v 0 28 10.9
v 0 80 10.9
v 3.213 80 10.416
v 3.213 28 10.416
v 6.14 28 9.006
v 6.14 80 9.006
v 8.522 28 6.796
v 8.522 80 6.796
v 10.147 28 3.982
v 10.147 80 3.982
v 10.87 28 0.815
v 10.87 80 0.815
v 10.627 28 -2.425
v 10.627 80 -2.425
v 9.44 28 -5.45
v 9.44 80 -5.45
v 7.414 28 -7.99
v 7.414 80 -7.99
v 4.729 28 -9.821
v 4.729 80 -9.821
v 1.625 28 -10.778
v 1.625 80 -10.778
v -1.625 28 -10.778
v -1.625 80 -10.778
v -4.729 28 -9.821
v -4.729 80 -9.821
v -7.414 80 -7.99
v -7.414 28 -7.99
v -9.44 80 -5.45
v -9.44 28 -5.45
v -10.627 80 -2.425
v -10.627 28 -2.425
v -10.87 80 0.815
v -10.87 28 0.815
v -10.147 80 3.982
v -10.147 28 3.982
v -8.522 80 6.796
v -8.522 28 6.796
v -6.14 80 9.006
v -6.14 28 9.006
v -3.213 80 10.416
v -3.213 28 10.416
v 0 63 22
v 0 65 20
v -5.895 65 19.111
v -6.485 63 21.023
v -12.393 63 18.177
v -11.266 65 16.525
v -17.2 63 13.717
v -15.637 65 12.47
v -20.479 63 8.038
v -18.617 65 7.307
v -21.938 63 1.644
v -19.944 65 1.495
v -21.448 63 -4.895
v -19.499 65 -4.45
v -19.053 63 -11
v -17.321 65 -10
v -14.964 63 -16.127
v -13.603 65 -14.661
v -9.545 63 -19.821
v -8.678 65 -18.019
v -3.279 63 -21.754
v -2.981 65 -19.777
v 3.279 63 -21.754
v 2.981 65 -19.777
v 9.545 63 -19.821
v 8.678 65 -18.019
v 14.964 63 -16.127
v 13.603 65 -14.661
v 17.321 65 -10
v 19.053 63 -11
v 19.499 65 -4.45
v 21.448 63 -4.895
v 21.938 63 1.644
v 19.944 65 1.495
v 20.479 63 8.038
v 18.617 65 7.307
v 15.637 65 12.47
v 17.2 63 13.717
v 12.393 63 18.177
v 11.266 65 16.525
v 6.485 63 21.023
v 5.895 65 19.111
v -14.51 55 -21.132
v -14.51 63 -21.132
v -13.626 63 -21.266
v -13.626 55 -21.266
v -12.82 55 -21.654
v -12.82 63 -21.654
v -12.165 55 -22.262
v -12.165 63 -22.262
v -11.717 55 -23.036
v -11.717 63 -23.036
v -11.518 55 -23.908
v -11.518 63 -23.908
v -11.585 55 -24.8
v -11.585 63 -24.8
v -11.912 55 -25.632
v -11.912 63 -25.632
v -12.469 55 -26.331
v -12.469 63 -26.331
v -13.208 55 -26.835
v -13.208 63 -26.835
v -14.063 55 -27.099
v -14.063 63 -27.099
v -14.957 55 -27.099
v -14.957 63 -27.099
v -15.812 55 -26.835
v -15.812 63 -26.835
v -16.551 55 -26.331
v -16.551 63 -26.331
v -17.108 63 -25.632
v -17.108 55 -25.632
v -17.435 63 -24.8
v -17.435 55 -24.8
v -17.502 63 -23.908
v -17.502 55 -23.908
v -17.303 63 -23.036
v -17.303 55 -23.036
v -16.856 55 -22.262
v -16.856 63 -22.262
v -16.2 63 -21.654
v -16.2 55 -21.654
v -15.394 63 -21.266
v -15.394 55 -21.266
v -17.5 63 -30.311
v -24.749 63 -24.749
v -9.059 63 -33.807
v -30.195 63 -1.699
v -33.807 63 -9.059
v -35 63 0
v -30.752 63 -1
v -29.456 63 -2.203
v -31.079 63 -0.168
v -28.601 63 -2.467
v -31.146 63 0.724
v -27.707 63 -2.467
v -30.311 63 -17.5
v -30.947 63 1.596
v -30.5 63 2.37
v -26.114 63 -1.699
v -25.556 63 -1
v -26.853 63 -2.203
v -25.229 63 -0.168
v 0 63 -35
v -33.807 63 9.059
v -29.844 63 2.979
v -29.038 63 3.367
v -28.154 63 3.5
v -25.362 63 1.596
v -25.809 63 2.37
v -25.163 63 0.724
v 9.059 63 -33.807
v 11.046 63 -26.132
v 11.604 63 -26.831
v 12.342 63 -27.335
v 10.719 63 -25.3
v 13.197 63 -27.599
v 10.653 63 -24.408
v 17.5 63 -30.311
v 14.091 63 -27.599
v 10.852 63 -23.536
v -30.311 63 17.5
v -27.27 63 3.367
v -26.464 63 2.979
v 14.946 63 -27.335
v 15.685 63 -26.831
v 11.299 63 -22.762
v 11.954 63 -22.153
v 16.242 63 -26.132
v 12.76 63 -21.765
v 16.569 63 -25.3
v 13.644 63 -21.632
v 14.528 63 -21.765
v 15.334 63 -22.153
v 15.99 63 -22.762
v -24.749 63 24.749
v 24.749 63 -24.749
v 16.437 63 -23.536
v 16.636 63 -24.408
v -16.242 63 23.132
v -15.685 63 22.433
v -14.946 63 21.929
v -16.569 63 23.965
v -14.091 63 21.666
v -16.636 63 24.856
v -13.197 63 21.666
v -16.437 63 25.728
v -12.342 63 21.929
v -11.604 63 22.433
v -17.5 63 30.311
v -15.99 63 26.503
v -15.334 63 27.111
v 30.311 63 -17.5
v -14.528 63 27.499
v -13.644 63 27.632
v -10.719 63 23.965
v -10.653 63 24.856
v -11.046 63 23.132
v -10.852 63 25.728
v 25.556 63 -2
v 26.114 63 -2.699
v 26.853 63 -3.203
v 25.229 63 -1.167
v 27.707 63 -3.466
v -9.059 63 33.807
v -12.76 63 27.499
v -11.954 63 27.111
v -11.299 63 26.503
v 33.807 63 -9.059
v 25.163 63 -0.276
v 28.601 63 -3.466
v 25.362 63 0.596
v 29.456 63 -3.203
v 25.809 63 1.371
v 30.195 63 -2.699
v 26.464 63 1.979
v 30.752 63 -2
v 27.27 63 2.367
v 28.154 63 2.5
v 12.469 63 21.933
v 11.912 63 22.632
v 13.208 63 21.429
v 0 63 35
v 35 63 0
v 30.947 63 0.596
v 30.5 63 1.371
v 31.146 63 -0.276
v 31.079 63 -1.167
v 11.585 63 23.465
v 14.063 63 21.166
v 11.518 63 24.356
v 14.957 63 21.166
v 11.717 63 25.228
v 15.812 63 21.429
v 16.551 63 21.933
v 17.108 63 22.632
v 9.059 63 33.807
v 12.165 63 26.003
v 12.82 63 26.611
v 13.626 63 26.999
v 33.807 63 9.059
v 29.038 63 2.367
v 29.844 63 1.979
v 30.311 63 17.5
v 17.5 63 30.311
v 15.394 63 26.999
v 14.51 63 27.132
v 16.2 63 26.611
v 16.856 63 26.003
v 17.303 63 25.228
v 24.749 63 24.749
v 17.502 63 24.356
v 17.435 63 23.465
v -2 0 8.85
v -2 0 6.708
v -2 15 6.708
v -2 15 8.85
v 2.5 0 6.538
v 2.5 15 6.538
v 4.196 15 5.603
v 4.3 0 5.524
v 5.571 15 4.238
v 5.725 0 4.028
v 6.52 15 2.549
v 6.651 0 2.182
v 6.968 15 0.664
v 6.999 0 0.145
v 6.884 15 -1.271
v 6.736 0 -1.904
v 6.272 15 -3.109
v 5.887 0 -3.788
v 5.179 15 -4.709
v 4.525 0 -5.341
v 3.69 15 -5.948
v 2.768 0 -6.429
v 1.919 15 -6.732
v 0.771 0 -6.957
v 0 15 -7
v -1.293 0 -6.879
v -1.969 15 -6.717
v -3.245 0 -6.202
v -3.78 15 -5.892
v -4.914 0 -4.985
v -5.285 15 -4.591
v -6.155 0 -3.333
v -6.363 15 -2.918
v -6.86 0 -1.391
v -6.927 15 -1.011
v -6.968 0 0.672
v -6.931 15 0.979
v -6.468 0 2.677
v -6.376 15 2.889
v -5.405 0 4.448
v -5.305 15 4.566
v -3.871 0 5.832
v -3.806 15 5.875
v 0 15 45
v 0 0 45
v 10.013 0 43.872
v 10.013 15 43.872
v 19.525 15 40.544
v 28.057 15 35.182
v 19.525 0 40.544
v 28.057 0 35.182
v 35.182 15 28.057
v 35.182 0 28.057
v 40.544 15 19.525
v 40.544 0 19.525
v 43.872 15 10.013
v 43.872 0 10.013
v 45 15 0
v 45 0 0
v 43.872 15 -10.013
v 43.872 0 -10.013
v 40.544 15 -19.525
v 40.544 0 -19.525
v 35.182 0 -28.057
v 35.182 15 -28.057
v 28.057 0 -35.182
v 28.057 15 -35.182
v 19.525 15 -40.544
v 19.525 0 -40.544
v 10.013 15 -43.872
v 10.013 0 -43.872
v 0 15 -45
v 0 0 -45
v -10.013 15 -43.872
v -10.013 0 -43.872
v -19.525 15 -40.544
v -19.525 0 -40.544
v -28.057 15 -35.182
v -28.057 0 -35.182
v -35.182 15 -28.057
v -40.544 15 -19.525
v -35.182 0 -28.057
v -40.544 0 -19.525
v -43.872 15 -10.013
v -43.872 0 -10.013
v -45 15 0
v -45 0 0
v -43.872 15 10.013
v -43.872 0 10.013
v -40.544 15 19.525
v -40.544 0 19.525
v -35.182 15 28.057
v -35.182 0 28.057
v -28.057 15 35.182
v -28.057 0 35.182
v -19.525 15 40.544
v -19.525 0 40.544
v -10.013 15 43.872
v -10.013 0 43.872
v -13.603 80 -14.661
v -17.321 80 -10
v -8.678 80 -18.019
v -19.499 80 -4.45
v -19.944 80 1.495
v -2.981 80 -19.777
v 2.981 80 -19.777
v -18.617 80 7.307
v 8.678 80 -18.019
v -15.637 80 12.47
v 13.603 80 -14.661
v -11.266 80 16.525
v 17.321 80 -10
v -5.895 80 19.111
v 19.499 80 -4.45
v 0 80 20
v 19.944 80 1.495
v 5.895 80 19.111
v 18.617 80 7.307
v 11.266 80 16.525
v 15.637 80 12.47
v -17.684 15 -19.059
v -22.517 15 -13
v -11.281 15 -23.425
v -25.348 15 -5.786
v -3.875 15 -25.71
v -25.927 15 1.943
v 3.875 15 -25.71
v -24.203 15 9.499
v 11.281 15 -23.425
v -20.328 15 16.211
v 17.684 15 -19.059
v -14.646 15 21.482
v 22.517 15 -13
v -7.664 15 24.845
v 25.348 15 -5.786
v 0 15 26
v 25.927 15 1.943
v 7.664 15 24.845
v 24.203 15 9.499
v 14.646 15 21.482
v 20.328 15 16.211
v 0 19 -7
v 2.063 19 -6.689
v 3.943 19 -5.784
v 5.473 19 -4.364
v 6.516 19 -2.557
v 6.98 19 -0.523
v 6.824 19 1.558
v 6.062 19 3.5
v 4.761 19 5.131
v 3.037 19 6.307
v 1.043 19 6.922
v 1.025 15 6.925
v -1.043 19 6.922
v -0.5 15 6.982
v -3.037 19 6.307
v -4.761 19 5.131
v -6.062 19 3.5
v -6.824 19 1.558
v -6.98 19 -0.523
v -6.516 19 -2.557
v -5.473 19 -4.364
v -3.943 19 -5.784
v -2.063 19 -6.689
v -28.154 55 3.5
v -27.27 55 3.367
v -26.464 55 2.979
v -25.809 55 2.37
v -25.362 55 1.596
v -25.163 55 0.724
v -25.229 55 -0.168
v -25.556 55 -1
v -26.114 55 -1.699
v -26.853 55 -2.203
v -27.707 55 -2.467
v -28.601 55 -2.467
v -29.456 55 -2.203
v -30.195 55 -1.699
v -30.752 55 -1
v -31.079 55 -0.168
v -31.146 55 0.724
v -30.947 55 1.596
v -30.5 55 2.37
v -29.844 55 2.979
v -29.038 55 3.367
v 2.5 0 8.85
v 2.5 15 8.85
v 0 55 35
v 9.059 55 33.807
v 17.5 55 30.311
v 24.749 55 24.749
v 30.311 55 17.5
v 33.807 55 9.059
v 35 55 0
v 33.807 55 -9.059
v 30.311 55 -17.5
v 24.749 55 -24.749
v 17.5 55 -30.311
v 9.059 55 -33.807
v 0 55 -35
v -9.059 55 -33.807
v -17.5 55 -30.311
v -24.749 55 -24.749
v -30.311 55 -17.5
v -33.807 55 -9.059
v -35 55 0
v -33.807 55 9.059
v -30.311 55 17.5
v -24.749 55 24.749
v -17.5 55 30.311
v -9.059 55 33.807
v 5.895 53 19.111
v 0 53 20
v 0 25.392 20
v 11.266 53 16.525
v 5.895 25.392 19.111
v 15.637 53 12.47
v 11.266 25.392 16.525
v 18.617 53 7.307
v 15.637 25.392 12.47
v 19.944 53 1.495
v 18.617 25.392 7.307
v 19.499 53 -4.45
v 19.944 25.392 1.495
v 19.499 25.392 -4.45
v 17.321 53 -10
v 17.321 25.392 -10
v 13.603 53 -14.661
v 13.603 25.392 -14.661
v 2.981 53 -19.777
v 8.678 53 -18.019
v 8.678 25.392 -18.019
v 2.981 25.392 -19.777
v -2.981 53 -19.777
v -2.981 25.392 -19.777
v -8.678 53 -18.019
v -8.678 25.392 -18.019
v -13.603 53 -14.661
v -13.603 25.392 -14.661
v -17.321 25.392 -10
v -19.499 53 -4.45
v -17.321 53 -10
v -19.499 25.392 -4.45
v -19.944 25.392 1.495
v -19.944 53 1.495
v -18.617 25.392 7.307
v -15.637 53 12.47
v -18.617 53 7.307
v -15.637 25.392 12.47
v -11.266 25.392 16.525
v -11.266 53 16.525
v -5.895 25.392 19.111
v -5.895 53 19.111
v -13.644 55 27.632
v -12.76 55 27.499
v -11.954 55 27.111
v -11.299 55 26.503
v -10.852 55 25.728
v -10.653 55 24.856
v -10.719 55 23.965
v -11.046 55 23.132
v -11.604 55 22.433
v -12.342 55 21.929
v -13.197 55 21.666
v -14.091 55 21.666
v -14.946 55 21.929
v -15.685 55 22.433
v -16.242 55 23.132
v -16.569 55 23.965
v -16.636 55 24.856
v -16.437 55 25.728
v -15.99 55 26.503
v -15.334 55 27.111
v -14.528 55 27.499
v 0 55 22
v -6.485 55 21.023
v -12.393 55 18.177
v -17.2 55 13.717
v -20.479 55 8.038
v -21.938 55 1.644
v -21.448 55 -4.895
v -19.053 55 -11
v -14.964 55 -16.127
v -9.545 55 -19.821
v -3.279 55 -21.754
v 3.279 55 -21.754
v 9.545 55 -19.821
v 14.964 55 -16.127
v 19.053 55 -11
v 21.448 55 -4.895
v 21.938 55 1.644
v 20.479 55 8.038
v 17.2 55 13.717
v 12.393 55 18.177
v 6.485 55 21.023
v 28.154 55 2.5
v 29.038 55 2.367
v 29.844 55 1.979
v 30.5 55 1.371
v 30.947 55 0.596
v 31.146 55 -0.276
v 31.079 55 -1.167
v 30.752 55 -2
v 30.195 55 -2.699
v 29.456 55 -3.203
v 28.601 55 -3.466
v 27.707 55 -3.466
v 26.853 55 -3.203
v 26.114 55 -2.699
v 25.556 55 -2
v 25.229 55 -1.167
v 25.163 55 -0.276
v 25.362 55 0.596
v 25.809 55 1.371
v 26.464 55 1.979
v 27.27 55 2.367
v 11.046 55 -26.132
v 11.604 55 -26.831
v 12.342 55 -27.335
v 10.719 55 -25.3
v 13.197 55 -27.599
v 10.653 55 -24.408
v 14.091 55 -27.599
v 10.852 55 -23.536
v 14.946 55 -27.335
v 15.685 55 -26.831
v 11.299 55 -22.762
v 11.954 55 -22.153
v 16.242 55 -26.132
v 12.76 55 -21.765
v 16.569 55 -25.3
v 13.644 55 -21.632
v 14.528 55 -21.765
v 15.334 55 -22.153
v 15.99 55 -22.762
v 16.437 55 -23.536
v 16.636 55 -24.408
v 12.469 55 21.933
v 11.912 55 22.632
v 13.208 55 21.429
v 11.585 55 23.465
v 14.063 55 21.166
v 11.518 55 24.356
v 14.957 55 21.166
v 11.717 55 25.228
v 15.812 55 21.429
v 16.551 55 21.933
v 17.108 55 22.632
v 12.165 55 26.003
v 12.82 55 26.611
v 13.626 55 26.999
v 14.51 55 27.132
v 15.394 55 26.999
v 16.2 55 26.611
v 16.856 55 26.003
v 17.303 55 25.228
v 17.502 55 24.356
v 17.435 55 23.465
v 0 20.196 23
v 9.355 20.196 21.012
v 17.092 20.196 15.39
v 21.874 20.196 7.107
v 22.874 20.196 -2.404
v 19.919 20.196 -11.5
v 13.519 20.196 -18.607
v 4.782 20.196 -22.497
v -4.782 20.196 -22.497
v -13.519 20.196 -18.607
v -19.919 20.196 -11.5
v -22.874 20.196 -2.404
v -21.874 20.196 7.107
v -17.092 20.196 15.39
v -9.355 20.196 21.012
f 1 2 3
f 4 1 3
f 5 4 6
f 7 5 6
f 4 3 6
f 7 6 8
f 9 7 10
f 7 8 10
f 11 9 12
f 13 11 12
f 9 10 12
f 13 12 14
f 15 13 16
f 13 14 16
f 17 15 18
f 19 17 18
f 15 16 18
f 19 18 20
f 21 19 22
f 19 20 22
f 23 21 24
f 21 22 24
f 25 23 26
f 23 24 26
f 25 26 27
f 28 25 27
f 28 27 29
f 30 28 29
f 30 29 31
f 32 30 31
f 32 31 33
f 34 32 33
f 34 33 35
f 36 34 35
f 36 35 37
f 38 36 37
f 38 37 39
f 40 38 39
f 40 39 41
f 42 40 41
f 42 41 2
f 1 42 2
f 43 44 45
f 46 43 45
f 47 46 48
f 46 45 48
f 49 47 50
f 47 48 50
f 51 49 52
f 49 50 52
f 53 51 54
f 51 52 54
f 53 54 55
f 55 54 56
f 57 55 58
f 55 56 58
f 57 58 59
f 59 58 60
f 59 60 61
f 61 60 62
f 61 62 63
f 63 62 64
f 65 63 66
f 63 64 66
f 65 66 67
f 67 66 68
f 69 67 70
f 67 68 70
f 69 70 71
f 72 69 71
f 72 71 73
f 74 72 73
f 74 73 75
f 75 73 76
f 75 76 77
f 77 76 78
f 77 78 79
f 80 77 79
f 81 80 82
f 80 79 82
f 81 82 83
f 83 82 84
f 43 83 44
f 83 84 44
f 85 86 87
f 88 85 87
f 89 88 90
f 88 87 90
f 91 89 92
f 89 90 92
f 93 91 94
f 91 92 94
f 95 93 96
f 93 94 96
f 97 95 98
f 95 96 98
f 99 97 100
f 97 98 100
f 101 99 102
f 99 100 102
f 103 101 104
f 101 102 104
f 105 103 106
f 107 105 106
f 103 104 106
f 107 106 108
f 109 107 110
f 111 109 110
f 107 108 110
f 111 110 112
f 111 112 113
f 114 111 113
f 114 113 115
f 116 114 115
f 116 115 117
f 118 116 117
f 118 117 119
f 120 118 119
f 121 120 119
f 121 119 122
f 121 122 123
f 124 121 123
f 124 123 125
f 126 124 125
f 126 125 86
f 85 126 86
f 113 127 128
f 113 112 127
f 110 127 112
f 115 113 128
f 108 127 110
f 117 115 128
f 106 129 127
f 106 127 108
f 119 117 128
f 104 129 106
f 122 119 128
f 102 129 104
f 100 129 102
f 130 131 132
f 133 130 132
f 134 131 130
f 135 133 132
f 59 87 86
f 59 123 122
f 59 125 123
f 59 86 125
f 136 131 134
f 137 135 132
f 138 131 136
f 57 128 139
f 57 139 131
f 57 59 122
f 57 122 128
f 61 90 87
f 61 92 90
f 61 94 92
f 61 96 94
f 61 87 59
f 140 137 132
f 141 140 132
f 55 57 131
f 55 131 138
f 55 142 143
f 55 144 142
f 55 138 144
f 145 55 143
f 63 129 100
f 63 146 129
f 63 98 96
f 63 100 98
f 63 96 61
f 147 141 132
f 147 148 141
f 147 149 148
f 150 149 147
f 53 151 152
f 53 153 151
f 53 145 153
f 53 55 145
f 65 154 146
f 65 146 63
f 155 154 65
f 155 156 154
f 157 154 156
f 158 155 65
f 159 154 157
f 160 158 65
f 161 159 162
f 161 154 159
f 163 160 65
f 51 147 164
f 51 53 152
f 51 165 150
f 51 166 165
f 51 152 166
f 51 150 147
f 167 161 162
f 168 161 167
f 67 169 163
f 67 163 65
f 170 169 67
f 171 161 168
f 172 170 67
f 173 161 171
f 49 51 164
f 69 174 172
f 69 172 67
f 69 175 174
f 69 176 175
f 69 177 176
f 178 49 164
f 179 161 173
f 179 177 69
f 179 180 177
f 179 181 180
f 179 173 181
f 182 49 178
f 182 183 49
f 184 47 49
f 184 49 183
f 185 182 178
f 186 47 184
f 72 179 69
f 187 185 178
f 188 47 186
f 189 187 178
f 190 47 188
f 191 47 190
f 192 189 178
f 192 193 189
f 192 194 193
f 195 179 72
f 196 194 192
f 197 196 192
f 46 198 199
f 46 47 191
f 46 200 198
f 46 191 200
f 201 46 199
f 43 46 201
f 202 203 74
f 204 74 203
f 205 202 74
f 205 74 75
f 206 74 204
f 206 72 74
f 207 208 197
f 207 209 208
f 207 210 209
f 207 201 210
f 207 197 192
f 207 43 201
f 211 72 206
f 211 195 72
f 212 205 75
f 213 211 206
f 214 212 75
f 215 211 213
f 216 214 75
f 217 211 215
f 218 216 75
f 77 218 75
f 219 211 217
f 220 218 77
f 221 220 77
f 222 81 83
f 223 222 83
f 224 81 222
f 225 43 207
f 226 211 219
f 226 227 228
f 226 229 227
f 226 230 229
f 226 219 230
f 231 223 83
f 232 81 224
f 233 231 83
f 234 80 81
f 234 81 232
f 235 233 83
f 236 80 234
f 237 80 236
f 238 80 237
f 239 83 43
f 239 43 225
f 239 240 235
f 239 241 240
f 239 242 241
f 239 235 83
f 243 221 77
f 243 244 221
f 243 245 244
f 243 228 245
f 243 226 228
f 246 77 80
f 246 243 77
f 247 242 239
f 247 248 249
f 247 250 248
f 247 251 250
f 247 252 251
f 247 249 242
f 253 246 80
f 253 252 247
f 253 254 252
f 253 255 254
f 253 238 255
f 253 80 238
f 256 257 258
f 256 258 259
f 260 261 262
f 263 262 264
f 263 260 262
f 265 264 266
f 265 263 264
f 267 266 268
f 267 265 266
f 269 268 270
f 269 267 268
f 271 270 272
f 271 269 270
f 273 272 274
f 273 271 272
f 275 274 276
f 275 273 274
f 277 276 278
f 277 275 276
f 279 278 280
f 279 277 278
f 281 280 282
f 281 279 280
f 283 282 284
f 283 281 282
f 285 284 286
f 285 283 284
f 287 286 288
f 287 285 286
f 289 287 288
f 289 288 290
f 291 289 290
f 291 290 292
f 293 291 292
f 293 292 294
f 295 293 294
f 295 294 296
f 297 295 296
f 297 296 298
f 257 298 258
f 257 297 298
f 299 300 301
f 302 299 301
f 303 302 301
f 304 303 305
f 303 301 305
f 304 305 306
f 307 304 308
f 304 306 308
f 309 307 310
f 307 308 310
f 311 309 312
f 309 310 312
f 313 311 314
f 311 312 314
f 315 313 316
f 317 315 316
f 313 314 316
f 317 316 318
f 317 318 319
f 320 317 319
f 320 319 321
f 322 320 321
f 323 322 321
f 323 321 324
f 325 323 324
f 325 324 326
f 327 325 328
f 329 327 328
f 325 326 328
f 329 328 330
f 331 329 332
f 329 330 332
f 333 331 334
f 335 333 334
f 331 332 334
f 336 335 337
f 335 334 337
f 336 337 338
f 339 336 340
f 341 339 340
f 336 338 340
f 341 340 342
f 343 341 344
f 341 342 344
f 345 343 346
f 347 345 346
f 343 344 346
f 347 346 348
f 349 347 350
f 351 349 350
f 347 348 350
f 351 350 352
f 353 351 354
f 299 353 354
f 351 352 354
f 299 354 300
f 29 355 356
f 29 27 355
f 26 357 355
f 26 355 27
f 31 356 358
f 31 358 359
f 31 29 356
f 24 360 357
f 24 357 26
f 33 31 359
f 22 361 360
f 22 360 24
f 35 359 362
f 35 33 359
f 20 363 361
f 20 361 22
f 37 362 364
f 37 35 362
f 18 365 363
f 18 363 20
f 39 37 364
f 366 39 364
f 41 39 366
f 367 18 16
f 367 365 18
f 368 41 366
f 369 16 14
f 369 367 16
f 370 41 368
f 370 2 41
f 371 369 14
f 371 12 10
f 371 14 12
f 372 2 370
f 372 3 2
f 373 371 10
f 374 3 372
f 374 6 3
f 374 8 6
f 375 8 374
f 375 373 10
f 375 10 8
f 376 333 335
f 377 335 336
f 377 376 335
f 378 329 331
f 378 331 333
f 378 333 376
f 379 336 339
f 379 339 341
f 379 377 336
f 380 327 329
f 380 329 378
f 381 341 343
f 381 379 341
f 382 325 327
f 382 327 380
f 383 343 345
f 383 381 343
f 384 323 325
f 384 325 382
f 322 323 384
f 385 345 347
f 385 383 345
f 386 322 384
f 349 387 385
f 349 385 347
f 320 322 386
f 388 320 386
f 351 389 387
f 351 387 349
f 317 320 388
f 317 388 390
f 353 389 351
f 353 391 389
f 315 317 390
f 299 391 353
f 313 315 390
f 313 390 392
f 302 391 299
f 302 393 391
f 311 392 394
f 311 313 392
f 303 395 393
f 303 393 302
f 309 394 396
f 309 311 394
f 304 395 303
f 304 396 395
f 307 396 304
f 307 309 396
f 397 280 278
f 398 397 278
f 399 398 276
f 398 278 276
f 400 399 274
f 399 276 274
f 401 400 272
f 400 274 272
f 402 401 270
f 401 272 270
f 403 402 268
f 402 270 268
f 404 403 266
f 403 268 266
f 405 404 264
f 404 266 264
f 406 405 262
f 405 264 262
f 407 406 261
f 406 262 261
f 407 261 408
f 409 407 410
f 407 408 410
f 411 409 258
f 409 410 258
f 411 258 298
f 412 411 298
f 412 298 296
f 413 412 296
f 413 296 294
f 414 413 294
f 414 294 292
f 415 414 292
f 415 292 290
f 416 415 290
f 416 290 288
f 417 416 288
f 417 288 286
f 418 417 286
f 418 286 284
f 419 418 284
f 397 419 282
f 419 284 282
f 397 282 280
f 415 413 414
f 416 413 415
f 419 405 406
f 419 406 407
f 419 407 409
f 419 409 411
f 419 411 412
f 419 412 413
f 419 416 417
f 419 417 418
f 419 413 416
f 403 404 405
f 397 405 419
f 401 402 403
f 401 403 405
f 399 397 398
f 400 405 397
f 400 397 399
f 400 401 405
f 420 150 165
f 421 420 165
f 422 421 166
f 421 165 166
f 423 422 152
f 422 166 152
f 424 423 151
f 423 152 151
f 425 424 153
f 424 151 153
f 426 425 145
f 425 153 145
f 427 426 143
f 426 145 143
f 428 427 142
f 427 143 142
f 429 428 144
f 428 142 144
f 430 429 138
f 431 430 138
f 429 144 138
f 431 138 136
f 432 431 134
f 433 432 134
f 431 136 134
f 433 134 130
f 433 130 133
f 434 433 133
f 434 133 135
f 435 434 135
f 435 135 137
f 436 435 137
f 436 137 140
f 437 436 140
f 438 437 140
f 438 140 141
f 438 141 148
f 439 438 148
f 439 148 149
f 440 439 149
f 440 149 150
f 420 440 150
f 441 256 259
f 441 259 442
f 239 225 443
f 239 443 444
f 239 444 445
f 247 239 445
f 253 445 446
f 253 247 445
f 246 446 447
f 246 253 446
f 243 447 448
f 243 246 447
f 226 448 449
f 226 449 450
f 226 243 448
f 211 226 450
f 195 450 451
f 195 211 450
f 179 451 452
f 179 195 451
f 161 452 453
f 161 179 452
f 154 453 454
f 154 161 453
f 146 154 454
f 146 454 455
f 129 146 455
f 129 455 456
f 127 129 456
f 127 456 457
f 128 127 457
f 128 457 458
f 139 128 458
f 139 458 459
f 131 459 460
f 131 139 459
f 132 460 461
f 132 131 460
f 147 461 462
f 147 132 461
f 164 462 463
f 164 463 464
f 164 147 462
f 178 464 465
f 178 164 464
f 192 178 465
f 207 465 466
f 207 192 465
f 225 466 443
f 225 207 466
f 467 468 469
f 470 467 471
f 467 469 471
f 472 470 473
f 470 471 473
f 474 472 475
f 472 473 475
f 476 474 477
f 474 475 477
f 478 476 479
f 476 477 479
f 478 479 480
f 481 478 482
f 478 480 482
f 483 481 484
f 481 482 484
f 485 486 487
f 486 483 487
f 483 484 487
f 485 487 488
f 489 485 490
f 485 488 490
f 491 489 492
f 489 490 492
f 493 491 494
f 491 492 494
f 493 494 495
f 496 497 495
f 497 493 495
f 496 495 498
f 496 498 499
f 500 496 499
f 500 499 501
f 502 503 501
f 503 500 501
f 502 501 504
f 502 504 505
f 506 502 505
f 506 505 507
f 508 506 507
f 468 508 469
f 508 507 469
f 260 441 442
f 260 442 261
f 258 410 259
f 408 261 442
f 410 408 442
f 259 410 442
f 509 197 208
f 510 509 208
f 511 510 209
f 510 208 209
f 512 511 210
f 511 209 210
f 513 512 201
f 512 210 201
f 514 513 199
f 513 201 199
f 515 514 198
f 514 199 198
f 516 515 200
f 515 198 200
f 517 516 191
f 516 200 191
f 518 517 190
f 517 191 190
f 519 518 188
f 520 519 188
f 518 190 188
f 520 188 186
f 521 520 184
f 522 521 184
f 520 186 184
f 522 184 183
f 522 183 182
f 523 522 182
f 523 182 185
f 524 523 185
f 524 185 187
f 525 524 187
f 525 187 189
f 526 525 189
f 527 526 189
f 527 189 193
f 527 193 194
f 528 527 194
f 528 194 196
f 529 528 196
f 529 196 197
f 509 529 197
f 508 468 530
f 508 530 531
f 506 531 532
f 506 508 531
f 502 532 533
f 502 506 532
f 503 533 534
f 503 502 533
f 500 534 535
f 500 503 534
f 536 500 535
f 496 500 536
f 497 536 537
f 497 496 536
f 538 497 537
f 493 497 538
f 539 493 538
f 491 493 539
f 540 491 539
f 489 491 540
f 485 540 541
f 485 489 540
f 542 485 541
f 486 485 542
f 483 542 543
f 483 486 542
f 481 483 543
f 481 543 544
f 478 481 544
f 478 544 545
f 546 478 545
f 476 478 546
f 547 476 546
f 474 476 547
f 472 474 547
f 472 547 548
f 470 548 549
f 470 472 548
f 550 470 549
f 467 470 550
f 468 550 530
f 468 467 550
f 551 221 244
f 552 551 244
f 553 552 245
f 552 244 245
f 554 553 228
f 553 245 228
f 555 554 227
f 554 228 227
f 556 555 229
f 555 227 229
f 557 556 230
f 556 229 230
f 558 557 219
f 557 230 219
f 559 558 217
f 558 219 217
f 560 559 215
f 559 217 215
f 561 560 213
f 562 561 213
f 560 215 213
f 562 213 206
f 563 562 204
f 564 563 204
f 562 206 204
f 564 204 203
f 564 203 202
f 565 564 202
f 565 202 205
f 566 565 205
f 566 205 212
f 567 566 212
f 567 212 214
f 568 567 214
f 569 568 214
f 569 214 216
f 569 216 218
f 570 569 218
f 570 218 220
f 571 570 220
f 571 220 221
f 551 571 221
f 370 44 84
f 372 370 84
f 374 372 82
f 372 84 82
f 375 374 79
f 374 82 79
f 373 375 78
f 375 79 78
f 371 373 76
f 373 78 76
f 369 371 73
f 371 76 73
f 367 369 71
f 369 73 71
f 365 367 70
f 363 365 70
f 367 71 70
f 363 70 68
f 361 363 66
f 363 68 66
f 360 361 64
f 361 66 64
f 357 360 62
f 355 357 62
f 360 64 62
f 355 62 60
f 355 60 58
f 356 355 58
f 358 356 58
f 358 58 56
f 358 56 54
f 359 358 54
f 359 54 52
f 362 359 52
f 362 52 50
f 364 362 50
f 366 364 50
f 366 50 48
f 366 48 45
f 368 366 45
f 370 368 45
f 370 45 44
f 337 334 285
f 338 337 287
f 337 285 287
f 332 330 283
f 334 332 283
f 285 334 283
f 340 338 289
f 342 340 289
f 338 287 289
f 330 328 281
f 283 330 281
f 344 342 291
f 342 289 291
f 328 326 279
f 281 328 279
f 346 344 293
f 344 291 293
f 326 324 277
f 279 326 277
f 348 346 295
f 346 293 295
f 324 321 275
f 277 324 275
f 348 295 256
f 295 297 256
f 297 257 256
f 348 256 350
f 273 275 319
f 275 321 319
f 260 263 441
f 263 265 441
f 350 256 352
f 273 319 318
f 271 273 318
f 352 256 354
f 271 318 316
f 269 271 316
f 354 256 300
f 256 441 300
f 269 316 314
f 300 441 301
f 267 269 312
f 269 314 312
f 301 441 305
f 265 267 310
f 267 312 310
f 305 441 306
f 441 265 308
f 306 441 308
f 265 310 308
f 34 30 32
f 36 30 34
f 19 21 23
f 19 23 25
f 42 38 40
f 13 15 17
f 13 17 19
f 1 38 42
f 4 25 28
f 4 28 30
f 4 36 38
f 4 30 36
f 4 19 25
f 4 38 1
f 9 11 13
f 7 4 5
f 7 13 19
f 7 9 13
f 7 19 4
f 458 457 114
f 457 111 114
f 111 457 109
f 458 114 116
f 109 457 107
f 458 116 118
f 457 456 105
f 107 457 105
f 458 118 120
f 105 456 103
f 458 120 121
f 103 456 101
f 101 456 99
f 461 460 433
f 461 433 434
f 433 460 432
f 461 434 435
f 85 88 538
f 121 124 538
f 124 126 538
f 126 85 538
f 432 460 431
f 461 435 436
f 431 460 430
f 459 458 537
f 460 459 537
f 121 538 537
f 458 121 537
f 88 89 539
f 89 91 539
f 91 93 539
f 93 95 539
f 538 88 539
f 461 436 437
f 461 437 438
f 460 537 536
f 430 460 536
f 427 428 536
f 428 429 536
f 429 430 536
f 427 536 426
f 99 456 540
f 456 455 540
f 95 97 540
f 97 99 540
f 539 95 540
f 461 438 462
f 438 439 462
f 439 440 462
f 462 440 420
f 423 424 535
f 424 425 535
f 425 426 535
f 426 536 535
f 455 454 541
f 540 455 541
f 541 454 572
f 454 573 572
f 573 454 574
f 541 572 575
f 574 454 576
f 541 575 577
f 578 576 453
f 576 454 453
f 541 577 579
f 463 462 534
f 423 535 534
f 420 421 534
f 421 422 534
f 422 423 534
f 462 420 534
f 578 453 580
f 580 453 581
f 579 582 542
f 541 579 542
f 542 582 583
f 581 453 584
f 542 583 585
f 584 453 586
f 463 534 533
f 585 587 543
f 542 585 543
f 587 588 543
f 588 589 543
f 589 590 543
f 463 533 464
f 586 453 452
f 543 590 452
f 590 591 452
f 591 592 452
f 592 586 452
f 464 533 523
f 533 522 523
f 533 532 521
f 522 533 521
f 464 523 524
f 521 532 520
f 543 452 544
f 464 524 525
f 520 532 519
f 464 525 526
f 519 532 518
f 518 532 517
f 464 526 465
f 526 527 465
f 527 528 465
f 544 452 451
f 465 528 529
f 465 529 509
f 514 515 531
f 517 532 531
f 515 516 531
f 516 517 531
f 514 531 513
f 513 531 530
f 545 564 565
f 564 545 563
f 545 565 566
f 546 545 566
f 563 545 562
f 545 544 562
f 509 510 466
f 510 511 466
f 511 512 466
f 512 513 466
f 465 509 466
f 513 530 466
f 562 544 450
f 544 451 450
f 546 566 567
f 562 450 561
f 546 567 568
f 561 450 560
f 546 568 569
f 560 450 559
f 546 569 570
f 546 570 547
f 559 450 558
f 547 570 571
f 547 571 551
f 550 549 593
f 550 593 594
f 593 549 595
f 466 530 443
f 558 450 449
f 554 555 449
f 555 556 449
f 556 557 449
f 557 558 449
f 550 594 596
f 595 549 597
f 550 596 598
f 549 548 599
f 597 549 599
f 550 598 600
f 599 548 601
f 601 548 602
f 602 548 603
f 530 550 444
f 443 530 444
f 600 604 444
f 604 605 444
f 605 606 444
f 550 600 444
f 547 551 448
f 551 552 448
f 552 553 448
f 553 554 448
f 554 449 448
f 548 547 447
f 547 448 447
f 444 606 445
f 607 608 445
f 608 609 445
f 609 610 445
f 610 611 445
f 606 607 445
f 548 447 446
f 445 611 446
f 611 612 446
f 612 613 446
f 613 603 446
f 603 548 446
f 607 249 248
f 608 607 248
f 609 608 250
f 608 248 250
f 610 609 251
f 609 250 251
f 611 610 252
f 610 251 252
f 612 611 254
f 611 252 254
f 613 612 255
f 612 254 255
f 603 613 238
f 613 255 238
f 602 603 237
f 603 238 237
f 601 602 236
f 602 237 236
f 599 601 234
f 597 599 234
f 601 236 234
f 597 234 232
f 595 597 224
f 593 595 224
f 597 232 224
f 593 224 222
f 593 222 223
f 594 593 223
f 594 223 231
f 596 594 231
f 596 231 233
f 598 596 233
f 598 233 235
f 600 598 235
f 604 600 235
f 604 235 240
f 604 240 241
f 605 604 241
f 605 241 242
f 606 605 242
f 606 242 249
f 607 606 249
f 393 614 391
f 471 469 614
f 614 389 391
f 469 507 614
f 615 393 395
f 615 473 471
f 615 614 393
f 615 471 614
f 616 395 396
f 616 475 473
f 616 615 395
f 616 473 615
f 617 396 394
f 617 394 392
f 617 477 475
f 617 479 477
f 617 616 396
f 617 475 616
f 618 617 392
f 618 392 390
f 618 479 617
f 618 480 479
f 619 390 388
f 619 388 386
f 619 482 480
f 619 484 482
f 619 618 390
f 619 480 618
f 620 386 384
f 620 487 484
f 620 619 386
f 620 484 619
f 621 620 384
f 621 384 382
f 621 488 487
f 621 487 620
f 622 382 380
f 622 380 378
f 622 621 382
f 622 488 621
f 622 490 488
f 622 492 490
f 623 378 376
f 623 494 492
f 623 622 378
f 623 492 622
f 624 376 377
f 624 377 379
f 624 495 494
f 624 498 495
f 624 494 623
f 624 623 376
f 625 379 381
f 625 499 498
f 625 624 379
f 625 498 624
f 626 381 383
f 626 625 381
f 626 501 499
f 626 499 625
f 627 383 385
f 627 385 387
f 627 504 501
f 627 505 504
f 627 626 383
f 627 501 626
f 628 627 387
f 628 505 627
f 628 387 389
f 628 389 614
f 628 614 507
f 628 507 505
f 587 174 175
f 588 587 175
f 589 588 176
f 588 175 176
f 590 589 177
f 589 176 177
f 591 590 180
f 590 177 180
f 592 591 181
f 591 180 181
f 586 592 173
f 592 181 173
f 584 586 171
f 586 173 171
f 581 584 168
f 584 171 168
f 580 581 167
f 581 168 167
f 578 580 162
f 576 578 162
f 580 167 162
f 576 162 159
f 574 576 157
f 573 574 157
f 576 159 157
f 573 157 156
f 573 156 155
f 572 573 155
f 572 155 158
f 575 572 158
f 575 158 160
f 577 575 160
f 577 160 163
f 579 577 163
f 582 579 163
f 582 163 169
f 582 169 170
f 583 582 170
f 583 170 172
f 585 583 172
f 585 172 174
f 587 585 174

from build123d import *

# Parameters (mm, degrees)
SKETCH_1_R          = 45
EXTRUDE_1_DEPTH     = 15
SKETCH_2_R          = 20
EXTRUDE_2_DEPTH     = 65
SKETCH_4_R          = 10.9
CUT_EXTRUDE_4_DEPTH = 52
EXTRUDE_START       = 8
SKETCH_5_R          = 35
SKETCH_5_R_2        = 10.9
EXTRUDE_5_DEPTH     = 8
CHAMFER_3_SIZE      = 2
CHAMFER_4_SIZE      = 6
CHAMFER_4_SIZE2     = 10.392304845
SKETCH_6_R          = 7
CUT_EXTRUDE_8_DEPTH = 4
CUT_EXTRUDE_1_REACH = 91.549
SKETCH_7_R          = 3


with BuildPart() as part:
    # Эскиз1 → Вытянуть1 (new body)
    with BuildSketch(Plane(origin=(0, 0, 0), x_dir=(1, 0, 0), z_dir=(0, 1, 0))):
        with Locations(Location((0, 0, 0), (0, 0, 270))):
            Circle(SKETCH_1_R)
        with BuildLine():
            Line((-2, -6.708203932), (-2, -8.85))
            Line((-2, -8.85), (2.5, -8.85))
            Line((2.5, -8.85), (2.5, -6.538348415))
            ThreePointArc((2.5, -6.538348415), (-0.264031673, 6.995018747), (-2, -6.708203932))
        make_face(mode=Mode.SUBTRACT)
    extrude(amount=EXTRUDE_1_DEPTH)

    # Эскиз2 → Вытянуть2 (add)
    with BuildSketch(Plane(origin=(0, 15, 0), x_dir=(1, 0, 0), z_dir=(0, 1, 0))):
        with Locations(Location((0, 0, 0), (0, 0, 270))):
            Circle(SKETCH_2_R)
    extrude(amount=EXTRUDE_2_DEPTH)

    # Эскиз4 → Вытянуть4 (cut)
    with BuildSketch(Plane(origin=(0, 80, 0), x_dir=(1, 0, 0), z_dir=(0, 1, 0))):
        with Locations(Location((0, 0, 0), (0, 0, 270))):
            Circle(SKETCH_4_R)
    extrude(amount=-CUT_EXTRUDE_4_DEPTH, mode=Mode.SUBTRACT)

    # Эскиз5 → Вытянуть5 (add)
    with BuildSketch(Plane(origin=(0, 55, 0), x_dir=(-1, 0, 0), z_dir=(0, 1, 0)).offset(EXTRUDE_START)):
        with Locations(Location((0, 0, 0), (0, 0, 90))):
            Circle(SKETCH_5_R)
        with Locations(Location((0, 0, 0), (0, 0, 90))):
            Circle(SKETCH_5_R_2, mode=Mode.SUBTRACT)
    extrude(amount=-EXTRUDE_5_DEPTH)

    # Фаска3
    chamfer_3_edges = [part.edges().sort_by_distance(p)[0] for p in [
        (0, 55, -20),
        (0, 63, -20),
    ]]
    chamfer(chamfer_3_edges, length=CHAMFER_3_SIZE)

    # Фаска4
    chamfer_4_edges = [part.edges().sort_by_distance(p)[0] for p in [
        (0, 15, -20),
    ]]
    chamfer_4_side = [part.faces().sort_by_distance(p)[0] for p in [
        (0, 15, -43.727207794),
    ]]
    chamfer(chamfer_4_edges, length=CHAMFER_4_SIZE, length2=CHAMFER_4_SIZE2, reference=chamfer_4_side[0])

    # Эскиз6 → Вытянуть8 (cut)
    with BuildSketch(Plane.XZ.offset(-15)):
        with Locations(Location((0, 0, 0), (0, 0, 270))):
            Circle(SKETCH_6_R)
    extrude(amount=-CUT_EXTRUDE_8_DEPTH, mode=Mode.SUBTRACT)

    # Эскиз7 → Вырез-Вытянуть1 (cut, up to next)
    with BuildSketch(Plane(origin=(0, 63, 0), x_dir=(1, 0, 0), z_dir=(0, 1, 0)), mode=Mode.PRIVATE) as cut_extrude_1_sk1:
        with Locations(Location((-28.154160791, -0.499908421, 0), (0, 0, 270))):
            Circle(SKETCH_7_R)
    cut_extrude_1_tool1 = extrude(cut_extrude_1_sk1.sketch, amount=-CUT_EXTRUDE_1_REACH, mode=Mode.PRIVATE) & part.part
    # Эскиз7 → Вырез-Вытянуть1 (cut, up to next)
    with BuildSketch(Plane(origin=(0, 63, 0), x_dir=(1, 0, 0), z_dir=(0, 1, 0)), mode=Mode.PRIVATE) as cut_extrude_1_sk2:
        with Locations(Location((-14.510013788, 24.132264256, 0), (0, 0, 270))):
            Circle(SKETCH_7_R)
    cut_extrude_1_tool2 = extrude(cut_extrude_1_sk2.sketch, amount=-CUT_EXTRUDE_1_REACH, mode=Mode.PRIVATE) & part.part
    # Эскиз7 → Вырез-Вытянуть1 (cut, up to next)
    with BuildSketch(Plane(origin=(0, 63, 0), x_dir=(1, 0, 0), z_dir=(0, 1, 0)), mode=Mode.PRIVATE) as cut_extrude_1_sk3:
        with Locations(Location((13.644147003, 24.632172678, 0), (0, 0, 270))):
            Circle(SKETCH_7_R)
    cut_extrude_1_tool3 = extrude(cut_extrude_1_sk3.sketch, amount=-CUT_EXTRUDE_1_REACH, mode=Mode.PRIVATE) & part.part
    # Эскиз7 → Вырез-Вытянуть1 (cut, up to next)
    with BuildSketch(Plane(origin=(0, 63, 0), x_dir=(1, 0, 0), z_dir=(0, 1, 0)), mode=Mode.PRIVATE) as cut_extrude_1_sk4:
        with Locations(Location((28.154160791, 0.499908421, 0), (0, 0, 270))):
            Circle(SKETCH_7_R)
    cut_extrude_1_tool4 = extrude(cut_extrude_1_sk4.sketch, amount=-CUT_EXTRUDE_1_REACH, mode=Mode.PRIVATE) & part.part
    # Эскиз7 → Вырез-Вытянуть1 (cut, up to next)
    with BuildSketch(Plane(origin=(0, 63, 0), x_dir=(1, 0, 0), z_dir=(0, 1, 0)), mode=Mode.PRIVATE) as cut_extrude_1_sk5:
        with Locations(Location((14.510013788, -24.132264256, 0), (0, 0, 270))):
            Circle(SKETCH_7_R)
    cut_extrude_1_tool5 = extrude(cut_extrude_1_sk5.sketch, amount=-CUT_EXTRUDE_1_REACH, mode=Mode.PRIVATE) & part.part
    # Эскиз7 → Вырез-Вытянуть1 (cut, up to next)
    with BuildSketch(Plane(origin=(0, 63, 0), x_dir=(1, 0, 0), z_dir=(0, 1, 0)), mode=Mode.PRIVATE) as cut_extrude_1_sk6:
        with Locations(Location((-13.644147003, -24.632172678, 0), (0, 0, 270))):
            Circle(SKETCH_7_R)
    cut_extrude_1_tool6 = extrude(cut_extrude_1_sk6.sketch, amount=-CUT_EXTRUDE_1_REACH, mode=Mode.PRIVATE) & part.part
    add(cut_extrude_1_tool1.solids().sort_by_distance((-28.154161, 63, 0.499908))[0], mode=Mode.SUBTRACT)
    add(cut_extrude_1_tool2.solids().sort_by_distance((-14.510014, 63, -24.132264))[0], mode=Mode.SUBTRACT)
    add(cut_extrude_1_tool3.solids().sort_by_distance((13.644147, 63, -24.632173))[0], mode=Mode.SUBTRACT)
    add(cut_extrude_1_tool4.solids().sort_by_distance((28.154161, 63, -0.499908))[0], mode=Mode.SUBTRACT)
    add(cut_extrude_1_tool5.solids().sort_by_distance((14.510014, 63, 24.132264))[0], mode=Mode.SUBTRACT)
    add(cut_extrude_1_tool6.solids().sort_by_distance((-13.644147, 63, 24.632173))[0], mode=Mode.SUBTRACT)


solid = part.part
